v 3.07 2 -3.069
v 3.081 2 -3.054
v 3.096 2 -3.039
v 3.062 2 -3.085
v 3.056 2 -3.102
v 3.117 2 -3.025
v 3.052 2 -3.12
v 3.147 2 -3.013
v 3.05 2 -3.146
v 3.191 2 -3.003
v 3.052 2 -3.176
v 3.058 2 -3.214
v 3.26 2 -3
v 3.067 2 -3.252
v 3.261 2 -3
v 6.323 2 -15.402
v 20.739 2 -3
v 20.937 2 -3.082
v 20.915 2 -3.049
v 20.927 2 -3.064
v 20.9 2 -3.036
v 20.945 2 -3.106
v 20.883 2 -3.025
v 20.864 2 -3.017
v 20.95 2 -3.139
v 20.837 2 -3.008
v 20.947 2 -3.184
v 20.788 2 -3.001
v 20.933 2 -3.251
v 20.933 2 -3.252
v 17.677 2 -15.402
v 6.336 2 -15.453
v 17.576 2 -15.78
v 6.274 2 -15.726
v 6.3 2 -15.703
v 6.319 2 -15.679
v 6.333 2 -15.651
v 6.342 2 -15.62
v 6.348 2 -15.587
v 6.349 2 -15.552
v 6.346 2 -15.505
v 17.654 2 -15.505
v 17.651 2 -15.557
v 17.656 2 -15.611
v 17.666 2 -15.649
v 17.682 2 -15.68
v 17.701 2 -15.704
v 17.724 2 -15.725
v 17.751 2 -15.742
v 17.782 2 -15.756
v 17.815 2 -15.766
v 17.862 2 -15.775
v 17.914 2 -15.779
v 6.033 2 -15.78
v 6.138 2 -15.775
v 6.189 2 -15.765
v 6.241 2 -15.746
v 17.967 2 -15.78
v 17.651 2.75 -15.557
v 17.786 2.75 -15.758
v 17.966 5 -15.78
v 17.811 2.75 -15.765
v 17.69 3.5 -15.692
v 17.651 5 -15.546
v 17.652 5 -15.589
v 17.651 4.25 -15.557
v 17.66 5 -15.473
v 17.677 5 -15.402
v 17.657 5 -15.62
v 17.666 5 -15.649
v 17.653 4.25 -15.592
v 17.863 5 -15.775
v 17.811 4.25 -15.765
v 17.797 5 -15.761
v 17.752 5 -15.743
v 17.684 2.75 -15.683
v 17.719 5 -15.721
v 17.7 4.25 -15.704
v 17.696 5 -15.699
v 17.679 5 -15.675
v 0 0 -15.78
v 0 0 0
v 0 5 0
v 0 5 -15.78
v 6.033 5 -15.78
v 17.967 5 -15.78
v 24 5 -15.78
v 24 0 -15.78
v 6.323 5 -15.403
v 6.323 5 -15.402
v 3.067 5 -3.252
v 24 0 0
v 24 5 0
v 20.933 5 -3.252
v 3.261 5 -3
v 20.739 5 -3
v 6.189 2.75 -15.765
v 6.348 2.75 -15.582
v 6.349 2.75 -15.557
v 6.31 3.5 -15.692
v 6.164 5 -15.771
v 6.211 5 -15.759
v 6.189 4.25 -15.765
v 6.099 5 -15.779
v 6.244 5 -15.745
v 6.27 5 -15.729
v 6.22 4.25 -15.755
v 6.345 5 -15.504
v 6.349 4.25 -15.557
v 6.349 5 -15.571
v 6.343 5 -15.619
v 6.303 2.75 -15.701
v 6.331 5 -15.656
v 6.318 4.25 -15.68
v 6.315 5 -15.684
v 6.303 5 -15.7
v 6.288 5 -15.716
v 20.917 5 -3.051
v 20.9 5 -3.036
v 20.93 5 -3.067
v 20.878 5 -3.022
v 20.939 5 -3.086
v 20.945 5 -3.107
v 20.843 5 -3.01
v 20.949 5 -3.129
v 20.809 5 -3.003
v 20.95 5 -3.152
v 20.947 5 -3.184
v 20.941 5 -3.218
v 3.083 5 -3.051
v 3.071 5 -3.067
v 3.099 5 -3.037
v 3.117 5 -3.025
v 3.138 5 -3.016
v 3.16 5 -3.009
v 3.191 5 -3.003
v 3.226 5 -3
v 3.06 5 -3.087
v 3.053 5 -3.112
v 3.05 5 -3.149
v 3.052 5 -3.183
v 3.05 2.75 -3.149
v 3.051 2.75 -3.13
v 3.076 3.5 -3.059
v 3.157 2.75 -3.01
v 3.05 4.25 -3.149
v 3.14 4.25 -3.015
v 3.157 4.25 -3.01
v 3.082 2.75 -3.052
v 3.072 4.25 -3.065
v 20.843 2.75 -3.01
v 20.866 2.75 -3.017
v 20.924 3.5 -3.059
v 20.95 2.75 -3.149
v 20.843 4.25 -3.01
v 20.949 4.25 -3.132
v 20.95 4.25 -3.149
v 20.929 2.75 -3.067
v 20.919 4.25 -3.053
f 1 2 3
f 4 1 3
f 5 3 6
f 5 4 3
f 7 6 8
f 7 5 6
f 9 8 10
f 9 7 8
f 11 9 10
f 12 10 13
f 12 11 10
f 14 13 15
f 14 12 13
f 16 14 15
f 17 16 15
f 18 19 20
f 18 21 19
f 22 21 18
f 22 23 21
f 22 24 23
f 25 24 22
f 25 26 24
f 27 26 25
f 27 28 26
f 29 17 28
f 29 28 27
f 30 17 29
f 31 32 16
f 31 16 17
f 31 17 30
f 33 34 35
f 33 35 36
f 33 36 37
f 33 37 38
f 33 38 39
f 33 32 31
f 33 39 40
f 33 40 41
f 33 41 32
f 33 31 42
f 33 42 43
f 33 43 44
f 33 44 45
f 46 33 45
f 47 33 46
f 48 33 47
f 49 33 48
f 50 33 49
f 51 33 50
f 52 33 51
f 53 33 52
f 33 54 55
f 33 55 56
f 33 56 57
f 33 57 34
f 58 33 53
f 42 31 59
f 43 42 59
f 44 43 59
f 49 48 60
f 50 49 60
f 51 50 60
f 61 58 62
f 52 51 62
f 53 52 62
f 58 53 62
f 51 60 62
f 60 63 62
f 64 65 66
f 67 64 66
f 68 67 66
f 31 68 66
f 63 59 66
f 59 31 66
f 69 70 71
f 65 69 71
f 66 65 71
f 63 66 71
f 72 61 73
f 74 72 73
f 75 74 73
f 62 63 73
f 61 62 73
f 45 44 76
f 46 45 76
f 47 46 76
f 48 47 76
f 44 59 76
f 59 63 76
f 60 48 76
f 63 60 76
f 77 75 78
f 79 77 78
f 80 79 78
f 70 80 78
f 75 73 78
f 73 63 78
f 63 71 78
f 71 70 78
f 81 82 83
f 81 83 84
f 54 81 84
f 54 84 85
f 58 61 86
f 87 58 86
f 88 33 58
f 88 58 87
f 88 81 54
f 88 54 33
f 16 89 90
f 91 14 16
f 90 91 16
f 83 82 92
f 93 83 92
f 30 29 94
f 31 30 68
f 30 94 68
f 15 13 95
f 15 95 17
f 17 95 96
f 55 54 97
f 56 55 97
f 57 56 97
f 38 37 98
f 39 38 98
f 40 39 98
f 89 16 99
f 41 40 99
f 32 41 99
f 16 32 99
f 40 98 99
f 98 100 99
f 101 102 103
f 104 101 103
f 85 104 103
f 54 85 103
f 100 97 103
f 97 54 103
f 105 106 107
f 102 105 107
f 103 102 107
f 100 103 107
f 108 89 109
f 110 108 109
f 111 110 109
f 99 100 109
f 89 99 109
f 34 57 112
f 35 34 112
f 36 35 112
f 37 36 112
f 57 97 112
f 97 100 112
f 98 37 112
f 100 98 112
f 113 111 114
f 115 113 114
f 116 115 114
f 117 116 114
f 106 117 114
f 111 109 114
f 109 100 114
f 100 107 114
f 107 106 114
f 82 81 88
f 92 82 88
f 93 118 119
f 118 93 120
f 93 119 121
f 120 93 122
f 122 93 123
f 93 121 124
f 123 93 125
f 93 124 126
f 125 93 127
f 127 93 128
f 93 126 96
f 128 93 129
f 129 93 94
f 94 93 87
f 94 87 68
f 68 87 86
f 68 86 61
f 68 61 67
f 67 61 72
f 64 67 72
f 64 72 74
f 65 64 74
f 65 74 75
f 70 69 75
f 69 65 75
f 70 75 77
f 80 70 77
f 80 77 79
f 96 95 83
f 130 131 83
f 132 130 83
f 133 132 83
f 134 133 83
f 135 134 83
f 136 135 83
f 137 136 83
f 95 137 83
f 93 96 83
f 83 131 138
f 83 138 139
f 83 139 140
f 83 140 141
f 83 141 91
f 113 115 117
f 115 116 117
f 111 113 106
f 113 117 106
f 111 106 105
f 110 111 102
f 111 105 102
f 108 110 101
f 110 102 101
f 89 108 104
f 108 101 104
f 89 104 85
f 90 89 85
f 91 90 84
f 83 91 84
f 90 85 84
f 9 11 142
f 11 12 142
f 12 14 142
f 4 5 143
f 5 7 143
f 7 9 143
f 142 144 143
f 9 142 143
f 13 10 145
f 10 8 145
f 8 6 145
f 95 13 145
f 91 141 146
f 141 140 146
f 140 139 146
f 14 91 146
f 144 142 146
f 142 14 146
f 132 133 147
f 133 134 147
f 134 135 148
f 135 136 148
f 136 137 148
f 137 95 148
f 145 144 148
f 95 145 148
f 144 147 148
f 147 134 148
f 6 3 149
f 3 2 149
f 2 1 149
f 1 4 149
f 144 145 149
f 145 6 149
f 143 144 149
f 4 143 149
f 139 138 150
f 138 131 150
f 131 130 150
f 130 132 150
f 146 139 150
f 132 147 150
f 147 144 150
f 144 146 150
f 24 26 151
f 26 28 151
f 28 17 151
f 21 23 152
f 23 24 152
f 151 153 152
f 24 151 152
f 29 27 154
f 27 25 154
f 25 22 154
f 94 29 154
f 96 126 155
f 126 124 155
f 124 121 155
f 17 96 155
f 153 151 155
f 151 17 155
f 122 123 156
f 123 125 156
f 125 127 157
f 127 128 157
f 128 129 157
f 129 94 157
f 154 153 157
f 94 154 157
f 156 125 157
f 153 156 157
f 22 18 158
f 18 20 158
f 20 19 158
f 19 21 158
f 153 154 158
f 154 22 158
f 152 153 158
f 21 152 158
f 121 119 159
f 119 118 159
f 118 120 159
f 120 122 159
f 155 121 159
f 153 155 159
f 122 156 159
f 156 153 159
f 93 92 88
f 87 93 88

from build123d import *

# Parameters (mm, degrees)
SKETCH1_W           = 24
SKETCH1_H           = 15.78
BOSS_EXTRUDE1_DEPTH = 5
CUT_EXTRUDE1_DEPTH  = 3


with BuildPart() as part:
    # Sketch1 → Boss-Extrude1 (new body)
    with BuildSketch(Plane(origin=(0, 0, 0), x_dir=(1, 0, 0), z_dir=(0, 1, 0))):
        with Locations((12, 7.89)):
            Rectangle(SKETCH1_W, SKETCH1_H)
    extrude(amount=BOSS_EXTRUDE1_DEPTH)

    # Sketch2 → Cut-Extrude1 (cut)
    with BuildSketch(Plane(origin=(0, 5, 0), x_dir=(1, 0, 0), z_dir=(0, 1, 0))):
        Polygon((6.424390679, 15.78), (3, 3), (21, 3), (17.575609321, 15.78), align=None)
    extrude(amount=-CUT_EXTRUDE1_DEPTH, mode=Mode.SUBTRACT)

    # Fillet1
    # a fillet whose section is not a circle: 0.2 mm, written as the material it adds along each edge
    with BuildSketch(Plane(origin=(21, 5, -3), x_dir=(-1, 0, 0), z_dir=(0, -1, 0)), Plane(origin=(3, 5, -3), x_dir=(0.25881904510252013, 0, -0.9659258262890685), z_dir=(0, -1, 0))) as fillet1_piece_1:
        with BuildLine():
            add(Edge.make_bspline([(0.260645075, 0), (0.21890515, 0), (0.177165225, 0), (0.086689828, 0.021204892), (0.042919331, 0.078247714), (0.045853734, 0.171128466), (0.056656822, 0.211446138), (0.067459909, 0.251763809)], knots=[0, 0, 0, 0, 0, 0, 0.5, 0.5, 1, 1, 1, 1, 1, 1], degree=5))
            Line((0.067459909, 0.251763809), (0, 0))
            Line((0, 0), (0.260645075, 0))
        make_face()
    extrude(amount=3.651612686)

    # Fillet2
    # a fillet whose section is not a circle: 0.3 mm, written as the material it takes off along each edge
    with BuildSketch(Plane(origin=(6.424390679, 5.97741903, -15.78), x_dir=(-1, 0, 0), z_dir=(0, -1, 0)), Plane(origin=(17.575609321, 5.97741903, -15.78), x_dir=(0.25881904510251846, 0, 0.9659258262890689), z_dir=(0, -1, 0))) as fillet2_piece_1:
        with BuildLine():
            add(Edge.make_bspline([(0.390967612, 0), (0.328357725, 0), (0.265747838, 0), (0.130034743, -0.031807338), (0.064378997, -0.117371571), (0.068780602, -0.2566927), (0.084985233, -0.317169207), (0.101189864, -0.377645714)], knots=[0, 0, 0, 0, 0, 0, 0.5, 0.5, 1, 1, 1, 1, 1, 1], degree=5))
            Line((0.101189864, -0.377645714), (0, 0))
            Line((0, 0), (0.390967612, 0))
        make_face()
    extrude(amount=3.97741903, mode=Mode.SUBTRACT)


solid = part.part
